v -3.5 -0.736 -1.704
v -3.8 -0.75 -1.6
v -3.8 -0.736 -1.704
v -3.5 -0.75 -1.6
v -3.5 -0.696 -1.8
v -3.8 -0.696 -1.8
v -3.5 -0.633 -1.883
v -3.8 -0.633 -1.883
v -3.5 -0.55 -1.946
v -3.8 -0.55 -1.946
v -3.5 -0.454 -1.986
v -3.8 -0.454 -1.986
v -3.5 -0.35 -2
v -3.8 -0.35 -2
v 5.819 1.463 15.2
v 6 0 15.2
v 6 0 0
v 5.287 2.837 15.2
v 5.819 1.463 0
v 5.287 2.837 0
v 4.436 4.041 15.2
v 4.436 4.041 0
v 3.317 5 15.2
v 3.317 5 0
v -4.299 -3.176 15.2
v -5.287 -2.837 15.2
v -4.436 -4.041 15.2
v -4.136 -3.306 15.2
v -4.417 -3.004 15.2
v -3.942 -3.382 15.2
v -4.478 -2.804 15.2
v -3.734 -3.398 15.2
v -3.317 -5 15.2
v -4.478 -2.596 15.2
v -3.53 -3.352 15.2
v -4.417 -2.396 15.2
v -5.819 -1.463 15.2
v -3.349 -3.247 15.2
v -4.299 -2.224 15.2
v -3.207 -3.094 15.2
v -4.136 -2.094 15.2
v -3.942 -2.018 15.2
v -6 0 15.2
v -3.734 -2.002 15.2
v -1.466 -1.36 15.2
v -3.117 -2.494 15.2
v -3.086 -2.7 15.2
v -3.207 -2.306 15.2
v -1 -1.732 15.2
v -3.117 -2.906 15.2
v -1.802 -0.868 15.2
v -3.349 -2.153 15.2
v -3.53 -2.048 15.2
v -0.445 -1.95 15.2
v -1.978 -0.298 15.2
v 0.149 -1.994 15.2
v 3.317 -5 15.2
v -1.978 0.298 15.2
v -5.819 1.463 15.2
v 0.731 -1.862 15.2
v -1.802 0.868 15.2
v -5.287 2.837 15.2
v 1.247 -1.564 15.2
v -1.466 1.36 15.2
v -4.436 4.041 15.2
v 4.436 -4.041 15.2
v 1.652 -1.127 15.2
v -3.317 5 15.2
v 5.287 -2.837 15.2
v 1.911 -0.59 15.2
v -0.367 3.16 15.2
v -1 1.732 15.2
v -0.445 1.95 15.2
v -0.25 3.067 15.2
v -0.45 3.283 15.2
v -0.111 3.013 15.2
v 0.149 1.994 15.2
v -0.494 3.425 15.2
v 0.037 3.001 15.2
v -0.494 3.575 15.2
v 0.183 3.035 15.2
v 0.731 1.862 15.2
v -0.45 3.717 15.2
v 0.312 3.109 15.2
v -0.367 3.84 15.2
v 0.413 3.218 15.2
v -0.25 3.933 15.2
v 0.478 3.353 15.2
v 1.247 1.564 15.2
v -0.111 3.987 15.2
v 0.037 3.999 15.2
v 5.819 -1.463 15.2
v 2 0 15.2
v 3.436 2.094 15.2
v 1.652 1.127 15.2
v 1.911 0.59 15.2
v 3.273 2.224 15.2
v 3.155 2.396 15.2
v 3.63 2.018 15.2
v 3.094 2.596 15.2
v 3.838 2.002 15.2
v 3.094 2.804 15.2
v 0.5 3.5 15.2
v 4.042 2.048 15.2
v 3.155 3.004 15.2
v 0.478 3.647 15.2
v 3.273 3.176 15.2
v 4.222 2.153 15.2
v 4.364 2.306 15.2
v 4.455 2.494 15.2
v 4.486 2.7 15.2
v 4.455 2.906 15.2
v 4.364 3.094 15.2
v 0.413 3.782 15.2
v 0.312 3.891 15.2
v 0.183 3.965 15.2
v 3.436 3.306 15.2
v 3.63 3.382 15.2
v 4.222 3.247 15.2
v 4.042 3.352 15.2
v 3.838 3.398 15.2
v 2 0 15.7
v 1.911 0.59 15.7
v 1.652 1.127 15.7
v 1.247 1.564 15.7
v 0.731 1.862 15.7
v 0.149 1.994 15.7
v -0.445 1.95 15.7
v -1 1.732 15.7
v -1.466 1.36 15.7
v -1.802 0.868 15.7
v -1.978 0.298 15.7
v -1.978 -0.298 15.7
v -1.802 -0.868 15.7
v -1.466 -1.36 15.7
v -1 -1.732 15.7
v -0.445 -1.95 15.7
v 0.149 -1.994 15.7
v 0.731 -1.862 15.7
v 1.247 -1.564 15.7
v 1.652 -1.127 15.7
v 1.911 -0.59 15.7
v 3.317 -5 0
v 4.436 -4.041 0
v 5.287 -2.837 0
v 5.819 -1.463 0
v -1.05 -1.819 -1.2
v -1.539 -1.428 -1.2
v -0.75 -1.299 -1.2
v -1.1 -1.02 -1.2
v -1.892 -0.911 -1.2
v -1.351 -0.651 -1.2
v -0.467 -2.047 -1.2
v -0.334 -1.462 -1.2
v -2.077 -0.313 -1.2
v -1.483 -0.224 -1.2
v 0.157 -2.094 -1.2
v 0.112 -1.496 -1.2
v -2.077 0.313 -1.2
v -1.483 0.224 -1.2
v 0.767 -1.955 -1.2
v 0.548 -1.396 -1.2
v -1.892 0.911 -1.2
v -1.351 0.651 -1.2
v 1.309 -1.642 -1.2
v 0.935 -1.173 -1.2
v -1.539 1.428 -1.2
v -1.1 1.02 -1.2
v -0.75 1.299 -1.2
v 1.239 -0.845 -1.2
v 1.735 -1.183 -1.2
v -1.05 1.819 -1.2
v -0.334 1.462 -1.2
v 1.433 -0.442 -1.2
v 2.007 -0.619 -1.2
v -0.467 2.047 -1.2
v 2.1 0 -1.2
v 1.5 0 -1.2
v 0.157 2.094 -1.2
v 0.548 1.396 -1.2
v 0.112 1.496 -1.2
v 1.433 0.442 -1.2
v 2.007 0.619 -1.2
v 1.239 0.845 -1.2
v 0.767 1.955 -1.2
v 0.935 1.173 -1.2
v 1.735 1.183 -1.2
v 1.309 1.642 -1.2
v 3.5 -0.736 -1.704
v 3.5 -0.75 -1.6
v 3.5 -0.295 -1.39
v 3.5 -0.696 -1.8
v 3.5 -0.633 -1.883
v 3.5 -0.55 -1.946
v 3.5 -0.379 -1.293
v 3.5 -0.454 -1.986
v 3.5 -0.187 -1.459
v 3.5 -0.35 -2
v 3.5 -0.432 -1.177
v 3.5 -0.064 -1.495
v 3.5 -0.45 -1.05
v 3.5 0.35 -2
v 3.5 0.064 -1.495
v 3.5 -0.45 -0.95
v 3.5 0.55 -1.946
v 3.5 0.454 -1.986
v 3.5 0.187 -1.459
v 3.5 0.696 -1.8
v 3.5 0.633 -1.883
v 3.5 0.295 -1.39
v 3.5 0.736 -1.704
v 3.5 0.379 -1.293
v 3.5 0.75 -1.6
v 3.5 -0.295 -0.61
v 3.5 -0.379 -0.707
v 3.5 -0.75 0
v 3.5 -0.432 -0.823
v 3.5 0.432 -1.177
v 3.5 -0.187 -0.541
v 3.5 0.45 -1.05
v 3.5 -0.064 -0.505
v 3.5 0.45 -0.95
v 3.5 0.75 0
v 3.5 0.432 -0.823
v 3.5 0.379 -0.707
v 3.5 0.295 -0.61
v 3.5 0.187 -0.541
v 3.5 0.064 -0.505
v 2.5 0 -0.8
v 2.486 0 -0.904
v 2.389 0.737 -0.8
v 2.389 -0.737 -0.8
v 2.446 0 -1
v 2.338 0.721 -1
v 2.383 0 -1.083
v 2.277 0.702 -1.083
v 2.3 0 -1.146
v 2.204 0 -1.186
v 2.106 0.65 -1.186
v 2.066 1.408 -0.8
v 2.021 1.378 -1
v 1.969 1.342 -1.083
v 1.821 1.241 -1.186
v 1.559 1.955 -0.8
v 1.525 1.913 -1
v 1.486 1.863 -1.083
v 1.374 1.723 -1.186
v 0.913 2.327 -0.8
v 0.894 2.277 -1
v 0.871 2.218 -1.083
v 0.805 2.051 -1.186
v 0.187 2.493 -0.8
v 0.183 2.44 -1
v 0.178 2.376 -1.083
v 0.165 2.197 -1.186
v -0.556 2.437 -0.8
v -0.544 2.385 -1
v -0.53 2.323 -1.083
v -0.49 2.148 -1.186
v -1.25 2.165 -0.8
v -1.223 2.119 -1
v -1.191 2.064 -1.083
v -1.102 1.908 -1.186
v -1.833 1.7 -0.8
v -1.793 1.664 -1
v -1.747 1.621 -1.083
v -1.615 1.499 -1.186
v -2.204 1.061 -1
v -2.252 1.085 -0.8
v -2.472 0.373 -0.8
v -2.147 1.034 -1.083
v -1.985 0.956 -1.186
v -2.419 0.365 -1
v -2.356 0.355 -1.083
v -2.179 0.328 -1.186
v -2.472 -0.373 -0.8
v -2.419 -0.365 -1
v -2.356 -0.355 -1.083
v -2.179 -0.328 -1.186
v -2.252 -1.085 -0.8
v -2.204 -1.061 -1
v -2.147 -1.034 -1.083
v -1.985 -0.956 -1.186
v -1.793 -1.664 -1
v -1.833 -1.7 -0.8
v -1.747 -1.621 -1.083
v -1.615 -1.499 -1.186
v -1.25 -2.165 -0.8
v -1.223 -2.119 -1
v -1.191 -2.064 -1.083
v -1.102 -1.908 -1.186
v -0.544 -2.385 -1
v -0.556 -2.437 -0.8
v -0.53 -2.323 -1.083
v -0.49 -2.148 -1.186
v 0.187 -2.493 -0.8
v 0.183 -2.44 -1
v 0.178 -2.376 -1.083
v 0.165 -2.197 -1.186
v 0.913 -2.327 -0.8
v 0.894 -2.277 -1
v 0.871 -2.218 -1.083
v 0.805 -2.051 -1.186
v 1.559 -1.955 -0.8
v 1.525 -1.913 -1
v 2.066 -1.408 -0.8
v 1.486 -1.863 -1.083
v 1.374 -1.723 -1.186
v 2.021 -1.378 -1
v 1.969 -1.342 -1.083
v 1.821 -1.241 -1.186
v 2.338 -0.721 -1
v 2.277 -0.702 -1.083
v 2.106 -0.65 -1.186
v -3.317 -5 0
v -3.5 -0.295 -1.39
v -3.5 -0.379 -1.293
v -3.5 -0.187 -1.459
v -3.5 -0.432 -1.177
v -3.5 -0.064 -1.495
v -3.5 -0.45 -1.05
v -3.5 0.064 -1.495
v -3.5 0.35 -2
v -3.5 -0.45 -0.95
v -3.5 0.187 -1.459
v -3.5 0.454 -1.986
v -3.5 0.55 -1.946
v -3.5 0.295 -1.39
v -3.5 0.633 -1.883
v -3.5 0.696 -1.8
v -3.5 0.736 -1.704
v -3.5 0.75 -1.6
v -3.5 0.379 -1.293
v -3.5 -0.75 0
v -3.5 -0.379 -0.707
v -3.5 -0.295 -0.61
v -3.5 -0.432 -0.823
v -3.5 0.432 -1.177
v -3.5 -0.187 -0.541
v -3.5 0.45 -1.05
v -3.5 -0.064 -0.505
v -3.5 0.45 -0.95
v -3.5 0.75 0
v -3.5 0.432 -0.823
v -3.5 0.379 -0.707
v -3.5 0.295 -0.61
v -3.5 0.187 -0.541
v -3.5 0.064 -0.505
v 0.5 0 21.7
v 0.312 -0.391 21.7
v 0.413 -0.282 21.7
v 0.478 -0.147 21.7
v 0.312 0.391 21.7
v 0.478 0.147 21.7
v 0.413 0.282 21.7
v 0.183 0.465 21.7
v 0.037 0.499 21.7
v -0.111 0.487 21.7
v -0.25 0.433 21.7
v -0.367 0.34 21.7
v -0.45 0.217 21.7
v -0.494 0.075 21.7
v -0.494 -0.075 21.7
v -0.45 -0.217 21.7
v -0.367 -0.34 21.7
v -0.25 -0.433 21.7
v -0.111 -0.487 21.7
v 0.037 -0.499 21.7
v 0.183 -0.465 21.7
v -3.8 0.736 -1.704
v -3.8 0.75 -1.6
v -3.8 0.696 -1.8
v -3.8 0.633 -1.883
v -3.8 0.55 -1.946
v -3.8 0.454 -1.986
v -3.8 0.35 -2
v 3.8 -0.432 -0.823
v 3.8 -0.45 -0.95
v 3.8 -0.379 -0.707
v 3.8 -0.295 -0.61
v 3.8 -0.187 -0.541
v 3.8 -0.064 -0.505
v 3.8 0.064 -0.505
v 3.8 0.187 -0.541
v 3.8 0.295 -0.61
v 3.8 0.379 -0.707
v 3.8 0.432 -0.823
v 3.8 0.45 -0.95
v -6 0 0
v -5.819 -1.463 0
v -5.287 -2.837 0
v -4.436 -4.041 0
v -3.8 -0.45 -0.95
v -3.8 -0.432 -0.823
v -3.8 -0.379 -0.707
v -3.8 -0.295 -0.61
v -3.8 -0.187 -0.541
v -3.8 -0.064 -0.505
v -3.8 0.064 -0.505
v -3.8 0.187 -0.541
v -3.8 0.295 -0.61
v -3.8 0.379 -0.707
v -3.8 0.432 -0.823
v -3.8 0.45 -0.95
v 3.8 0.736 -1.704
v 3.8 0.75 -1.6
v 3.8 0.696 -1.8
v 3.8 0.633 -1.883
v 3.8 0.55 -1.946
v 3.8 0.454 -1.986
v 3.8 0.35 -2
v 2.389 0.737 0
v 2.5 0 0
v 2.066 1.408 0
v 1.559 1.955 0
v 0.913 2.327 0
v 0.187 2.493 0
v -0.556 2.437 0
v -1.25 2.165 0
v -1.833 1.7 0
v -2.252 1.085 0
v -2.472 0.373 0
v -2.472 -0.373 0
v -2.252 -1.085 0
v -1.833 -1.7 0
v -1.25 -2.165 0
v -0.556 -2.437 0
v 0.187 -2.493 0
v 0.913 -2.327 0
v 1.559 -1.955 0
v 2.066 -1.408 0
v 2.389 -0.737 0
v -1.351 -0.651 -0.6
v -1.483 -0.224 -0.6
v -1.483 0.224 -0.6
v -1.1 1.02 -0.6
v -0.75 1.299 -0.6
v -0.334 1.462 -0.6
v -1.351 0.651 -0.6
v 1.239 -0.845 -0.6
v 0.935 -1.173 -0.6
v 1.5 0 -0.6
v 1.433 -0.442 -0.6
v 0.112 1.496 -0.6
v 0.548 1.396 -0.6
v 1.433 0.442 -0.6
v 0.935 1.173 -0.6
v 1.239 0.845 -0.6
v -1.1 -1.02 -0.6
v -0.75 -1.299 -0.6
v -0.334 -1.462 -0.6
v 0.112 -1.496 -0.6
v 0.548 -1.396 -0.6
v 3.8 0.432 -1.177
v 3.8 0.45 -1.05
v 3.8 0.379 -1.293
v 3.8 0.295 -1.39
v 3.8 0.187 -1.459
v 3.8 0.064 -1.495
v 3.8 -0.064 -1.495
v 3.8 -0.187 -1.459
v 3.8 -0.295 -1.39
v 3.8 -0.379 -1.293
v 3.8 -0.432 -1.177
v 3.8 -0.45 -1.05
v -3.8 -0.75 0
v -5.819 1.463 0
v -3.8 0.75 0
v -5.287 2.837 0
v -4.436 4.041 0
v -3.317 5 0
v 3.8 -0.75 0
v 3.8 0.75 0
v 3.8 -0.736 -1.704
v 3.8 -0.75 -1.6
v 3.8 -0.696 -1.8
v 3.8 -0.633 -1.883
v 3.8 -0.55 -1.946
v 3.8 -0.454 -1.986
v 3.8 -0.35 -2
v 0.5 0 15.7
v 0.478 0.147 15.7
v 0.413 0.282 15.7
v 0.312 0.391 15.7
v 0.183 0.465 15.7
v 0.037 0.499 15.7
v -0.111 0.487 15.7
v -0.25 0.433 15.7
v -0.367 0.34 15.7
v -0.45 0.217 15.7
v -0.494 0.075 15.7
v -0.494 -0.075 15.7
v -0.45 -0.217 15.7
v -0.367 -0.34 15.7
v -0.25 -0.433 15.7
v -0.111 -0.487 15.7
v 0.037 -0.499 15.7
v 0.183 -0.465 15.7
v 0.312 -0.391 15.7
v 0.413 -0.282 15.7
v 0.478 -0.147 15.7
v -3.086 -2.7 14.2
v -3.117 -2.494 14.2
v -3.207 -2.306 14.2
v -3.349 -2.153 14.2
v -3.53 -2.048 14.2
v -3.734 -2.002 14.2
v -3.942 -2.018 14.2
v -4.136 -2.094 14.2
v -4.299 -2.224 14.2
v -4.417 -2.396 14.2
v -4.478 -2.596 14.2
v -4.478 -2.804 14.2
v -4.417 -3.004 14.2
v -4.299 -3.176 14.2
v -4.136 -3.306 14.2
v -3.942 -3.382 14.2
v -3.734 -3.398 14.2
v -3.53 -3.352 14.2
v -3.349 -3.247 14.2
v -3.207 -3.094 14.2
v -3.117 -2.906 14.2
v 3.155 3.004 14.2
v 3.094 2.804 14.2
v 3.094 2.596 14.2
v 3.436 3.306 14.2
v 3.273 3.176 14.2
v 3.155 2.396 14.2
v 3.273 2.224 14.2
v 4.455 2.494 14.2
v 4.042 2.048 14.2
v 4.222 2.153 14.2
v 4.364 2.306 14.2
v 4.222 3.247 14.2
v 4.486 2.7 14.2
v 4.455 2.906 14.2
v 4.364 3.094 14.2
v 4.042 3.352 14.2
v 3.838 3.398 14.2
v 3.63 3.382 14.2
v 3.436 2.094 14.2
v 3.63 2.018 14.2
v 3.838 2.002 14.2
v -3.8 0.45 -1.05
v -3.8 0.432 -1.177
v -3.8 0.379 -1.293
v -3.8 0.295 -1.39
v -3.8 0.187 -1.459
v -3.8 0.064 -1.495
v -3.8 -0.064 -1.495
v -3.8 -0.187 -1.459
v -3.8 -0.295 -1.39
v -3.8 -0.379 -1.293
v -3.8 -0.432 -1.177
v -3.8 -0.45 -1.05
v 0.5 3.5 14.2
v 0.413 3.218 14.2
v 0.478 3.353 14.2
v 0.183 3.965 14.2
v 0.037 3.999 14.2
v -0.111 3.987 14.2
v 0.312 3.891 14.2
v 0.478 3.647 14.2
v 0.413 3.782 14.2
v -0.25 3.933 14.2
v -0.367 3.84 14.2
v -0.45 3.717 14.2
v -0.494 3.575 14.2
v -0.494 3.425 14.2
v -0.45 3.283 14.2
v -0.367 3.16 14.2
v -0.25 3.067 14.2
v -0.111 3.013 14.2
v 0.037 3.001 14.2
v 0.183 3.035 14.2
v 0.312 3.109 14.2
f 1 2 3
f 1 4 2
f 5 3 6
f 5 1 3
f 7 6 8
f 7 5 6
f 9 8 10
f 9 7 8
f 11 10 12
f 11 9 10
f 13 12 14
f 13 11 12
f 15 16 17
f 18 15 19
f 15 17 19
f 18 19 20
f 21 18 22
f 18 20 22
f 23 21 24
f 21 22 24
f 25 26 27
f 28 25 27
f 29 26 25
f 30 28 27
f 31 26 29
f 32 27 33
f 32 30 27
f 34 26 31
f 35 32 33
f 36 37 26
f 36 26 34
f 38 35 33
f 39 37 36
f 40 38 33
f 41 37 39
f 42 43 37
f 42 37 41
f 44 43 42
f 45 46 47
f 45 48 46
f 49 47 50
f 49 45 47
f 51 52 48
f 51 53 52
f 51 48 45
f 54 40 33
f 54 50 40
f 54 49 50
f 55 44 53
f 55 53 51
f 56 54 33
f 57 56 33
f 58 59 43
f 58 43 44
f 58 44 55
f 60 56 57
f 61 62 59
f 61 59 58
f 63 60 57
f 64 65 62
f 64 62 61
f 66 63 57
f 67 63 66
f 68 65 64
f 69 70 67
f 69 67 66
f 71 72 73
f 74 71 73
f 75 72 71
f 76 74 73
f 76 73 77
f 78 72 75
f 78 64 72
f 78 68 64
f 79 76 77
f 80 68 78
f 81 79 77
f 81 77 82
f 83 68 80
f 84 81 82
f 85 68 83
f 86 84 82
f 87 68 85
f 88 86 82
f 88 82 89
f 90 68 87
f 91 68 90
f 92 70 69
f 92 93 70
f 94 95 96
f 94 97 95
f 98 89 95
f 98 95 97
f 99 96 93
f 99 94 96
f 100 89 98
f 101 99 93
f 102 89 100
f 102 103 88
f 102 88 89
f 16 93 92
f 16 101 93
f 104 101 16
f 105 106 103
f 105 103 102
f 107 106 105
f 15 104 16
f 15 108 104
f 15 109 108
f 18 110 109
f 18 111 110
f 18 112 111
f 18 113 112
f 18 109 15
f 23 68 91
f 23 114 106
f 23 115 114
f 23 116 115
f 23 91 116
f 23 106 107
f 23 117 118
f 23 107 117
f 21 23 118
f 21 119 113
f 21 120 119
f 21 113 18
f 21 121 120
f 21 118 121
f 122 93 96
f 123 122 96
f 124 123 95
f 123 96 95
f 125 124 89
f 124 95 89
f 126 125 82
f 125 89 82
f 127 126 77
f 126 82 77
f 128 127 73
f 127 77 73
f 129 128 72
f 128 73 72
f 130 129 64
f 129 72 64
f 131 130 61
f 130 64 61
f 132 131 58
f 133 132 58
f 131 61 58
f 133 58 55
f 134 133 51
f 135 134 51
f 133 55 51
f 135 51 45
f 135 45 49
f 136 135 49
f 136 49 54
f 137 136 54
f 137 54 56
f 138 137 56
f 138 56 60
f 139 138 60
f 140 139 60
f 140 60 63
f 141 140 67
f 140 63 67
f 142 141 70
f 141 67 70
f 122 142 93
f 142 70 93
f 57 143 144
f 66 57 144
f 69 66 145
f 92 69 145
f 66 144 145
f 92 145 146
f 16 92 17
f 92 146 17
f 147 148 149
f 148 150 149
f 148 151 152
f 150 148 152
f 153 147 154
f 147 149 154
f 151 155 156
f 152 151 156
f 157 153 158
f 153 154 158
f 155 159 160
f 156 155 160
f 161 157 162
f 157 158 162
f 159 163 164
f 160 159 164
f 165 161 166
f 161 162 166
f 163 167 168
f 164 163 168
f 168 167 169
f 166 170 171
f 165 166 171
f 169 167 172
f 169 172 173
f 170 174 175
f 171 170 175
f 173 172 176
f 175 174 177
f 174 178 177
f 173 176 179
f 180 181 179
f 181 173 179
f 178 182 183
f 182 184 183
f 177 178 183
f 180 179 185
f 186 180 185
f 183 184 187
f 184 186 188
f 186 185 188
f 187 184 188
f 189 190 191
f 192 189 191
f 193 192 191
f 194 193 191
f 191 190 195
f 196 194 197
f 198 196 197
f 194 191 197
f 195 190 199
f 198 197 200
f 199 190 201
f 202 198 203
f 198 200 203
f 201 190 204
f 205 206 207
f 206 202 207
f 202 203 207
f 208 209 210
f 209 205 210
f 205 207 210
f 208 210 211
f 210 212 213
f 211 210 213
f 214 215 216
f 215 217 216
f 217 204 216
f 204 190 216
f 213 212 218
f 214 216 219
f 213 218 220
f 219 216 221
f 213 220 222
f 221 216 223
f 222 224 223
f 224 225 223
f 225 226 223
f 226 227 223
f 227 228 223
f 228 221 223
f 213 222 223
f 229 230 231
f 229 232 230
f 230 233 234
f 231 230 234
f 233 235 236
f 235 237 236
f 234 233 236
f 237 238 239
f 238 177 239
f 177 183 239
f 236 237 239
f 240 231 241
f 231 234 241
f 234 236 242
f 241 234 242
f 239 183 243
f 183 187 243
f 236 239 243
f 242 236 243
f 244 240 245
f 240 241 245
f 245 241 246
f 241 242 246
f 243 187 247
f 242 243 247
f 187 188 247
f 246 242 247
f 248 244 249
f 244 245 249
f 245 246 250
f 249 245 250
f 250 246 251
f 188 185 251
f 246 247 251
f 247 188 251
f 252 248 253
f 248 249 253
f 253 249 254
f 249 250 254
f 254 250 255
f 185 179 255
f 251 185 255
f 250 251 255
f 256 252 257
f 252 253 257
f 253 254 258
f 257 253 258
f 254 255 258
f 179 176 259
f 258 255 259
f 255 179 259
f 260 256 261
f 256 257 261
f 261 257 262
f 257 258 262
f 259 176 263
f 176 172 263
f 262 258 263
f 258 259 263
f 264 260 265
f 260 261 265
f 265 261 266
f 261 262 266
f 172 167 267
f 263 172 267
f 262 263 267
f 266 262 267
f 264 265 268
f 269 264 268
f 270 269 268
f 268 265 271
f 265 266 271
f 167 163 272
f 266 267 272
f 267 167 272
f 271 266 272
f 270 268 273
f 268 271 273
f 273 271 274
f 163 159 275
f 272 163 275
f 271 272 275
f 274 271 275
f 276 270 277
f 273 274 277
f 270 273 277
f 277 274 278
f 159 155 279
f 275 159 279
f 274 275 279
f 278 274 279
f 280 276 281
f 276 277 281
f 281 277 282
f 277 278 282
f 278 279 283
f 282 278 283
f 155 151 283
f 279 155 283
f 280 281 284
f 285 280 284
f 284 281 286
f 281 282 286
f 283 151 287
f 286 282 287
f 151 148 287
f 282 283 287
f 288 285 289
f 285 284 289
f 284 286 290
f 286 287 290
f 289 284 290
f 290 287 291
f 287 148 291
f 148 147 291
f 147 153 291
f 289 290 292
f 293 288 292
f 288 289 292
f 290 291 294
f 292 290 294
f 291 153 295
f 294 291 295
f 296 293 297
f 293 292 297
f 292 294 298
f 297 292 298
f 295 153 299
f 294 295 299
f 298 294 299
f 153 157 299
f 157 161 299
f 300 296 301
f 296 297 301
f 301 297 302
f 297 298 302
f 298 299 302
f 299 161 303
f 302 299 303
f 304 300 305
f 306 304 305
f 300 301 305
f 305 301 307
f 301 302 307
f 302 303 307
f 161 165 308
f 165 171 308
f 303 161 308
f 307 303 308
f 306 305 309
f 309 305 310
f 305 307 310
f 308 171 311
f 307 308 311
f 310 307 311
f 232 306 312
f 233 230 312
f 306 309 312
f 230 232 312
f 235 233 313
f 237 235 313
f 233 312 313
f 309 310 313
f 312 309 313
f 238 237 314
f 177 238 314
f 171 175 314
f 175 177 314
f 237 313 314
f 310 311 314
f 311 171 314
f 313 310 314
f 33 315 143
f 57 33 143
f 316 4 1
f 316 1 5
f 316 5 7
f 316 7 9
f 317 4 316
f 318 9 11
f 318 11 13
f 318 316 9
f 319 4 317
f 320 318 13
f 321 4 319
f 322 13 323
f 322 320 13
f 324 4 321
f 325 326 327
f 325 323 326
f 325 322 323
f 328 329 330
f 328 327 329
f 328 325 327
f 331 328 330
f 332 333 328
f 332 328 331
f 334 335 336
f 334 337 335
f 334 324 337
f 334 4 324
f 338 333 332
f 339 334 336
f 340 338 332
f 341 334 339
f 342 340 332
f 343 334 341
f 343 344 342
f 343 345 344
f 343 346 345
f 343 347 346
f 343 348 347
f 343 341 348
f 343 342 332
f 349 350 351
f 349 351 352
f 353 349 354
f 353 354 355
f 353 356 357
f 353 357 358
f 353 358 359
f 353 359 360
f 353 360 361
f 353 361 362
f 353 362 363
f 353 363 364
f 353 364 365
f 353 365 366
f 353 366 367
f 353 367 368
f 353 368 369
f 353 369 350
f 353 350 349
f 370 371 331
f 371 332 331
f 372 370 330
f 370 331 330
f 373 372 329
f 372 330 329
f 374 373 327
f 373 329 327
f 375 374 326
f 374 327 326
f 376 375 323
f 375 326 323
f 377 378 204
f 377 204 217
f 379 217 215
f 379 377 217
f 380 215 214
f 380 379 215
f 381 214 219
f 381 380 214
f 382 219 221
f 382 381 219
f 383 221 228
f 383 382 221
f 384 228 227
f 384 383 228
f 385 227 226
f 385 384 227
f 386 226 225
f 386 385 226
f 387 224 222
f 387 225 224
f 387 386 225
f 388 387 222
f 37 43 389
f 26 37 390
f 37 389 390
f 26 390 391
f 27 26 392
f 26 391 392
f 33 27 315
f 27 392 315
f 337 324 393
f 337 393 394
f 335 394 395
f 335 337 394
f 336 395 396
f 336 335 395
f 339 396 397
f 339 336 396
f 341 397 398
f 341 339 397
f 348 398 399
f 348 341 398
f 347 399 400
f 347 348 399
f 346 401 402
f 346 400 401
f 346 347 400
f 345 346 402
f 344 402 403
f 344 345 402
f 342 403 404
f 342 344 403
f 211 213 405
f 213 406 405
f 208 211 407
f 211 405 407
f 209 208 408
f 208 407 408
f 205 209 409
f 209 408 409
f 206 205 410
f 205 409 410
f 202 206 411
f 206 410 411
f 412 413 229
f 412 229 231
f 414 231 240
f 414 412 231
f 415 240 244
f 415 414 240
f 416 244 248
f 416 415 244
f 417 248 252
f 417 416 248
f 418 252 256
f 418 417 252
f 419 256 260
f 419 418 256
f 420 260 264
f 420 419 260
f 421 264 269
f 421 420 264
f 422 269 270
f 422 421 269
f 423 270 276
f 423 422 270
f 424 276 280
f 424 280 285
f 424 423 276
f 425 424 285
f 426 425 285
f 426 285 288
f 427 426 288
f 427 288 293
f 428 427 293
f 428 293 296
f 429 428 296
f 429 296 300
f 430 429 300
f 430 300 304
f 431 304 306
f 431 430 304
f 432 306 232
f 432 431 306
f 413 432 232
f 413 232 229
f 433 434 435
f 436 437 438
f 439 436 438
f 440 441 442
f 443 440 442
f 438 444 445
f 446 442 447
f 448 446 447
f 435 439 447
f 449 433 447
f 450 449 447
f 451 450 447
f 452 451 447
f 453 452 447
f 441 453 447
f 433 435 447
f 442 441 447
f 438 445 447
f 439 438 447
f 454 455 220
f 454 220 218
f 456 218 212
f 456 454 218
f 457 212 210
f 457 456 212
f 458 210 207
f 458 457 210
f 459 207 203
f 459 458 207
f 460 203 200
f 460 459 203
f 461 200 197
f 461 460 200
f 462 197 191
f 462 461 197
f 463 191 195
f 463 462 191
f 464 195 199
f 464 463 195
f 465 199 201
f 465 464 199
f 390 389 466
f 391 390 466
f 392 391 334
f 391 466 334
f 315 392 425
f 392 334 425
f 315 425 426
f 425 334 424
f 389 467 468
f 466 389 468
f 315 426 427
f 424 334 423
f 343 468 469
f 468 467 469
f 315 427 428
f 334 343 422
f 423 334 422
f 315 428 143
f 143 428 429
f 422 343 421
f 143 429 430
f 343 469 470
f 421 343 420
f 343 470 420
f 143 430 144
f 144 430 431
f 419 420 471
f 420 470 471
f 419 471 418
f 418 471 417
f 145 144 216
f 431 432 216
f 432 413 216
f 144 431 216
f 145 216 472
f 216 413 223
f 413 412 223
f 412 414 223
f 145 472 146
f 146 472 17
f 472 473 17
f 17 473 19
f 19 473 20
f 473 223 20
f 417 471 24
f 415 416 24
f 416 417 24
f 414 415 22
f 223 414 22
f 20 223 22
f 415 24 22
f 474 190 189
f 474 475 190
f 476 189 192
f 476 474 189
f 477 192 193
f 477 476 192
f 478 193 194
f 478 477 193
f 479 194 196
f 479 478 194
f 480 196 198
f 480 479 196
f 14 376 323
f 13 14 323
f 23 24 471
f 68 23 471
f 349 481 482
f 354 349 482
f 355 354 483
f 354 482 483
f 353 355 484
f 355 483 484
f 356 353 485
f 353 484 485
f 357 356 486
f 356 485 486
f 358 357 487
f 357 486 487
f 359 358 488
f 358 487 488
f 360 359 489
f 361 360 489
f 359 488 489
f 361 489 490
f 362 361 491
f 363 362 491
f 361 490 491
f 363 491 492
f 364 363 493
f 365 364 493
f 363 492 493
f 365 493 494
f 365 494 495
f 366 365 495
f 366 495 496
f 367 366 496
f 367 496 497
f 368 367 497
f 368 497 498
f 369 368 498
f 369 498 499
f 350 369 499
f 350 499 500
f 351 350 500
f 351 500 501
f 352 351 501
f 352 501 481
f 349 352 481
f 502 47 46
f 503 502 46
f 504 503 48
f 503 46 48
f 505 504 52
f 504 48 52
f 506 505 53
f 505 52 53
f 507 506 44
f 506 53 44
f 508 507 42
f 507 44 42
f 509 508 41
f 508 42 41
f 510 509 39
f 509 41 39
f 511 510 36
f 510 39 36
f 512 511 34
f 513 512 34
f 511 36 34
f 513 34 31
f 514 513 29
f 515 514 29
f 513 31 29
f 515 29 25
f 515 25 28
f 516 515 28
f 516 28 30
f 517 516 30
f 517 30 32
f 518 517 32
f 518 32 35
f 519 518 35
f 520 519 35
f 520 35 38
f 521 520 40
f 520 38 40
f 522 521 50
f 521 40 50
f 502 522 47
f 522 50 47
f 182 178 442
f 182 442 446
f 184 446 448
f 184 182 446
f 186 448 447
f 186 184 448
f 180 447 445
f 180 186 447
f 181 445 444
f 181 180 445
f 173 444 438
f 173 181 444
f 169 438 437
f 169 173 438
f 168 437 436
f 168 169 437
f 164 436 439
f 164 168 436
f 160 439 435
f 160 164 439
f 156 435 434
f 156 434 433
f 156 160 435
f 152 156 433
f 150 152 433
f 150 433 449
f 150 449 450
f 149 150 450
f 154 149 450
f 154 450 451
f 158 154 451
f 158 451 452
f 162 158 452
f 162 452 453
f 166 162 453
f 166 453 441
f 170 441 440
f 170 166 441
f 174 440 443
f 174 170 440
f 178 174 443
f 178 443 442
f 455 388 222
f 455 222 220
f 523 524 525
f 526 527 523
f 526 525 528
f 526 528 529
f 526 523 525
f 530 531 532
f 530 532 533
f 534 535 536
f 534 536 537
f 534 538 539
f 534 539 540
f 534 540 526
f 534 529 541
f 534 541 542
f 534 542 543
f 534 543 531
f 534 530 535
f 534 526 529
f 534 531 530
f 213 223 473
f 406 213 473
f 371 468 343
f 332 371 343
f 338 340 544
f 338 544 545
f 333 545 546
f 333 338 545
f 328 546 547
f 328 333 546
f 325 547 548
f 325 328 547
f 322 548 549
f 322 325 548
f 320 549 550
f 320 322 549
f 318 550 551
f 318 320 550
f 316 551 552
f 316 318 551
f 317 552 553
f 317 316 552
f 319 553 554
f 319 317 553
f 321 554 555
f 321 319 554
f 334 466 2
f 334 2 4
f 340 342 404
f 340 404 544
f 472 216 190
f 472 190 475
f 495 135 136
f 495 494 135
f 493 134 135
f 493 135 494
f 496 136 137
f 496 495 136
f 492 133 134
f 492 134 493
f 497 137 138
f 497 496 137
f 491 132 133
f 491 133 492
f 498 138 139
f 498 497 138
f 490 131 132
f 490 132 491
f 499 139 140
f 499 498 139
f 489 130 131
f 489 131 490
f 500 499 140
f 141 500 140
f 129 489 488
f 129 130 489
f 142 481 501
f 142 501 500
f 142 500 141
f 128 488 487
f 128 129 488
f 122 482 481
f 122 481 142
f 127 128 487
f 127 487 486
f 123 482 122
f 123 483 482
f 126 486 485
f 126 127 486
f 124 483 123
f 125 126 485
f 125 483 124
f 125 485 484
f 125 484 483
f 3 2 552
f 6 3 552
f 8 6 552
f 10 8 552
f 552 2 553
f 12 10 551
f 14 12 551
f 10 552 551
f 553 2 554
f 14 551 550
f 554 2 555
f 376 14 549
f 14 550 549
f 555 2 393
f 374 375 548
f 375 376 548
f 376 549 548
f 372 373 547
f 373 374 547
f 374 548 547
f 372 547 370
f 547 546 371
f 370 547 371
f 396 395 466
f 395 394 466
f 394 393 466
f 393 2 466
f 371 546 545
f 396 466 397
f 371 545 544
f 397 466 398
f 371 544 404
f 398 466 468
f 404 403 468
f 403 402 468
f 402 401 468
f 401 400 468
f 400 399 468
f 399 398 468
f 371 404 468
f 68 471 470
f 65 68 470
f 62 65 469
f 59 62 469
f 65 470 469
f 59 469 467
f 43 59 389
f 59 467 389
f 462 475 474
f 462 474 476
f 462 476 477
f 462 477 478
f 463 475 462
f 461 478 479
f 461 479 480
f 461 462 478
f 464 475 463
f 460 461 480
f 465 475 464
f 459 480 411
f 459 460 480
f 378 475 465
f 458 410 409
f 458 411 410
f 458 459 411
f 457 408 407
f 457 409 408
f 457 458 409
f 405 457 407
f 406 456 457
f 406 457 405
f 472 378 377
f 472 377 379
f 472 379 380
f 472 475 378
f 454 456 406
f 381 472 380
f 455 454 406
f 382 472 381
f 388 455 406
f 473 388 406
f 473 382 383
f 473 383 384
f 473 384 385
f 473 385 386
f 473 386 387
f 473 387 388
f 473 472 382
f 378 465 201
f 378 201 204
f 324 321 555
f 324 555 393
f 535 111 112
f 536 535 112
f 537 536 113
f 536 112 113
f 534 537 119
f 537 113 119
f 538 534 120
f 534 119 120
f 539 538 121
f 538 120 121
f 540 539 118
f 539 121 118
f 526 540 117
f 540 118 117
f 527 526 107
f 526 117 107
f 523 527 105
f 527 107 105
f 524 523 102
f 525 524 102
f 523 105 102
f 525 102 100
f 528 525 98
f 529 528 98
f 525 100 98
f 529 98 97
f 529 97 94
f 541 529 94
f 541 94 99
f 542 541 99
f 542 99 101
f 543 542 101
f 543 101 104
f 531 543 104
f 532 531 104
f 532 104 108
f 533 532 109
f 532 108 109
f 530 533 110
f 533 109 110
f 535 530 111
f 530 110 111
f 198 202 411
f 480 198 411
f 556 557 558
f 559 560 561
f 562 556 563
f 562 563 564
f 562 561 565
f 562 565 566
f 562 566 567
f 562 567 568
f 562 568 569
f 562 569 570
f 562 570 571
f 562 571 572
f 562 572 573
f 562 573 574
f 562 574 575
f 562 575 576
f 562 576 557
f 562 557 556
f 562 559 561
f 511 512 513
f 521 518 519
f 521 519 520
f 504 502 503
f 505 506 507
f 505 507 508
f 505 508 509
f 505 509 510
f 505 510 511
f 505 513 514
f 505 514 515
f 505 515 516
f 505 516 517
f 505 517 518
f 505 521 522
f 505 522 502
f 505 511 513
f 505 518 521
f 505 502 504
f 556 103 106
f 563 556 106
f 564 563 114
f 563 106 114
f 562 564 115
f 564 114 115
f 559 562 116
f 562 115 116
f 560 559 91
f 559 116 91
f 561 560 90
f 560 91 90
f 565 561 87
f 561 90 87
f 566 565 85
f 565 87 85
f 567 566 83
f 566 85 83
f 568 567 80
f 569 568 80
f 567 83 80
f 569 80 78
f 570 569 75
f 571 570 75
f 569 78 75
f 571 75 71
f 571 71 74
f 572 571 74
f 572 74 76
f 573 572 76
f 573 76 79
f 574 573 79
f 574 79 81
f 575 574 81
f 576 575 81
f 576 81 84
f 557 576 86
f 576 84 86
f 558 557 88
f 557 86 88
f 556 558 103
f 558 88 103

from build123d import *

# Parameters (mm, degrees)
SKETCH_1_W          = 0.3
SKETCH_1_H          = 1.5
SKETCH_1_R          = 2.5
SKETCH_1_R_2        = 1.5
EXTRUDE_1_DEPTH     = 15.2
SKETCH_1_4_W        = 0.3
SKETCH_1_4_H        = 1.5
EXTRUDE_2_DEPTH     = 2
CUT_EXTRUDE_2_DEPTH = 19.763794925
FILLET_1_R          = 0.4
SKETCH_1_5_R        = 2.5
SKETCH_1_5_R_2      = 1.5
EXTRUDE_3_DEPTH     = 1.2
CUT_EXTRUDE_START   = -1.2
SKETCH_1_7_R        = 1.5
CUT_EXTRUDE_1_DEPTH = 0.6
FILLET_2_R          = 0.4
SKETCH_3_R          = 2
EXTRUDE_4_DEPTH     = 0.5
SKETCH_3_3_R        = 0.5
EXTRUDE_5_DEPTH     = 6.5
SKETCH_4_R          = 0.7
SKETCH_4_R_2        = 0.5
CUT_EXTRUDE_3_DEPTH = 1


with BuildPart() as part:
    # 草图1 → 凸台-拉伸1 (new body)
    # profile 1 of 5: a face of its own
    with BuildSketch(Plane.XY):
        with BuildLine():
            ThreePointArc((-6, 0), (-5.286764074, -2.837274331), (-3.31662479, -5))
            Line((-3.31662479, -5), (3.31662479, -5))
            ThreePointArc((3.31662479, -5), (5.286764074, -2.837274331), (6, 0))
            ThreePointArc((6, 0), (5.286764074, 2.837274331), (3.31662479, 5))
            Line((3.31662479, 5), (-3.31662479, 5))
            ThreePointArc((-3.31662479, 5), (-5.286764074, 2.837274331), (-6, 0))
        make_face()
        with Locations((-3.65, 0)):
            Rectangle(SKETCH_1_W, SKETCH_1_H, mode=Mode.SUBTRACT)
        Circle(SKETCH_1_R, mode=Mode.SUBTRACT)
        with Locations((3.65, 0)):
            Rectangle(SKETCH_1_W, SKETCH_1_H, mode=Mode.SUBTRACT)
    # profile 2 of 5: a face of its own
    with BuildSketch(Plane.XY):
        Circle(SKETCH_1_R)
        Circle(SKETCH_1_R_2, mode=Mode.SUBTRACT)
    # profile 3 of 5: a face of its own
    with BuildSketch(Plane.XY):
        Circle(SKETCH_1_R_2)
    # profile 4 of 5: a face of its own
    with BuildSketch(Plane.XY):
        with Locations((3.65, 0)):
            Rectangle(SKETCH_1_W, SKETCH_1_H)
    # profile 5 of 5: a face of its own
    with BuildSketch(Plane.XY):
        with Locations((-3.65, 0)):
            Rectangle(SKETCH_1_W, SKETCH_1_H)
    extrude(amount=EXTRUDE_1_DEPTH)

    # 草图1<4> → 凸台-拉伸2 (add)
    with BuildSketch(Plane.XY):
        with Locations((3.65, 0)):
            Rectangle(SKETCH_1_4_W, SKETCH_1_4_H)
        with Locations((-3.65, 0)):
            Rectangle(SKETCH_1_4_W, SKETCH_1_4_H)
    extrude(amount=-EXTRUDE_2_DEPTH)

    # 草图2 → 切除-拉伸2 (cut, through all)
    with BuildSketch(Plane(origin=(3.8, 0, 0), x_dir=(0, 0, -1), z_dir=(1, 0, 0))):
        with BuildLine():
            Line((0.95, 0.45), (1.05, 0.45))
            ThreePointArc((1.05, 0.45), (1.5, 0), (1.05, -0.45))
            Line((1.05, -0.45), (0.95, -0.45))
            ThreePointArc((0.95, -0.45), (0.5, 0), (0.95, 0.45))
        make_face()
    extrude(amount=-CUT_EXTRUDE_2_DEPTH, mode=Mode.SUBTRACT)

    # 圆角1
    fillet_1_edges = [part.edges().sort_by_distance(p)[0] for p in [
        (3.65, -0.75, -2),
        (3.65, 0.75, -2),
        (-3.65, -0.75, -2),
        (-3.65, 0.75, -2),
    ]]
    fillet(fillet_1_edges, radius=FILLET_1_R)

    # 草图1<5> → 凸台-拉伸3 (add)
    # profile 1 of 2: a face of its own
    with BuildSketch(Plane.XY):
        Circle(SKETCH_1_5_R)
        Circle(SKETCH_1_5_R_2, mode=Mode.SUBTRACT)
    # profile 2 of 2: a face of its own
    with BuildSketch(Plane.XY):
        Circle(SKETCH_1_5_R_2)
    extrude(amount=-EXTRUDE_3_DEPTH)

    # 草图1<7> → 切除-拉伸1 (cut)
    with BuildSketch(Plane.XY.offset(CUT_EXTRUDE_START)):
        Circle(SKETCH_1_7_R)
    extrude(amount=CUT_EXTRUDE_1_DEPTH, mode=Mode.SUBTRACT)

    # 圆角2
    fillet_2_edges = [part.edges().sort_by_distance(p)[0] for p in [
        (-2.5, 0, -1.2),
    ]]
    fillet(fillet_2_edges, radius=FILLET_2_R)

    # 草图3 → 凸台-拉伸4 (add)
    with BuildSketch(Plane.XY.offset(15.2)):
        Circle(SKETCH_3_R)
    extrude(amount=EXTRUDE_4_DEPTH)

    # 草图3<3> → 凸台-拉伸5 (add)
    with BuildSketch(Plane.XY.offset(15.2)):
        Circle(SKETCH_3_3_R)
    extrude(amount=EXTRUDE_5_DEPTH)

    # 草图4 → 切除-拉伸3 (cut)
    with BuildSketch(Plane.XY.offset(15.2)):
        with Locations((-3.785828839, -2.7)):
            Circle(SKETCH_4_R)
        with Locations((3.785828839, 2.7)):
            Circle(SKETCH_4_R)
        with Locations((0, 3.5)):
            Circle(SKETCH_4_R_2)
    extrude(amount=-CUT_EXTRUDE_3_DEPTH, mode=Mode.SUBTRACT)


solid = part.part
